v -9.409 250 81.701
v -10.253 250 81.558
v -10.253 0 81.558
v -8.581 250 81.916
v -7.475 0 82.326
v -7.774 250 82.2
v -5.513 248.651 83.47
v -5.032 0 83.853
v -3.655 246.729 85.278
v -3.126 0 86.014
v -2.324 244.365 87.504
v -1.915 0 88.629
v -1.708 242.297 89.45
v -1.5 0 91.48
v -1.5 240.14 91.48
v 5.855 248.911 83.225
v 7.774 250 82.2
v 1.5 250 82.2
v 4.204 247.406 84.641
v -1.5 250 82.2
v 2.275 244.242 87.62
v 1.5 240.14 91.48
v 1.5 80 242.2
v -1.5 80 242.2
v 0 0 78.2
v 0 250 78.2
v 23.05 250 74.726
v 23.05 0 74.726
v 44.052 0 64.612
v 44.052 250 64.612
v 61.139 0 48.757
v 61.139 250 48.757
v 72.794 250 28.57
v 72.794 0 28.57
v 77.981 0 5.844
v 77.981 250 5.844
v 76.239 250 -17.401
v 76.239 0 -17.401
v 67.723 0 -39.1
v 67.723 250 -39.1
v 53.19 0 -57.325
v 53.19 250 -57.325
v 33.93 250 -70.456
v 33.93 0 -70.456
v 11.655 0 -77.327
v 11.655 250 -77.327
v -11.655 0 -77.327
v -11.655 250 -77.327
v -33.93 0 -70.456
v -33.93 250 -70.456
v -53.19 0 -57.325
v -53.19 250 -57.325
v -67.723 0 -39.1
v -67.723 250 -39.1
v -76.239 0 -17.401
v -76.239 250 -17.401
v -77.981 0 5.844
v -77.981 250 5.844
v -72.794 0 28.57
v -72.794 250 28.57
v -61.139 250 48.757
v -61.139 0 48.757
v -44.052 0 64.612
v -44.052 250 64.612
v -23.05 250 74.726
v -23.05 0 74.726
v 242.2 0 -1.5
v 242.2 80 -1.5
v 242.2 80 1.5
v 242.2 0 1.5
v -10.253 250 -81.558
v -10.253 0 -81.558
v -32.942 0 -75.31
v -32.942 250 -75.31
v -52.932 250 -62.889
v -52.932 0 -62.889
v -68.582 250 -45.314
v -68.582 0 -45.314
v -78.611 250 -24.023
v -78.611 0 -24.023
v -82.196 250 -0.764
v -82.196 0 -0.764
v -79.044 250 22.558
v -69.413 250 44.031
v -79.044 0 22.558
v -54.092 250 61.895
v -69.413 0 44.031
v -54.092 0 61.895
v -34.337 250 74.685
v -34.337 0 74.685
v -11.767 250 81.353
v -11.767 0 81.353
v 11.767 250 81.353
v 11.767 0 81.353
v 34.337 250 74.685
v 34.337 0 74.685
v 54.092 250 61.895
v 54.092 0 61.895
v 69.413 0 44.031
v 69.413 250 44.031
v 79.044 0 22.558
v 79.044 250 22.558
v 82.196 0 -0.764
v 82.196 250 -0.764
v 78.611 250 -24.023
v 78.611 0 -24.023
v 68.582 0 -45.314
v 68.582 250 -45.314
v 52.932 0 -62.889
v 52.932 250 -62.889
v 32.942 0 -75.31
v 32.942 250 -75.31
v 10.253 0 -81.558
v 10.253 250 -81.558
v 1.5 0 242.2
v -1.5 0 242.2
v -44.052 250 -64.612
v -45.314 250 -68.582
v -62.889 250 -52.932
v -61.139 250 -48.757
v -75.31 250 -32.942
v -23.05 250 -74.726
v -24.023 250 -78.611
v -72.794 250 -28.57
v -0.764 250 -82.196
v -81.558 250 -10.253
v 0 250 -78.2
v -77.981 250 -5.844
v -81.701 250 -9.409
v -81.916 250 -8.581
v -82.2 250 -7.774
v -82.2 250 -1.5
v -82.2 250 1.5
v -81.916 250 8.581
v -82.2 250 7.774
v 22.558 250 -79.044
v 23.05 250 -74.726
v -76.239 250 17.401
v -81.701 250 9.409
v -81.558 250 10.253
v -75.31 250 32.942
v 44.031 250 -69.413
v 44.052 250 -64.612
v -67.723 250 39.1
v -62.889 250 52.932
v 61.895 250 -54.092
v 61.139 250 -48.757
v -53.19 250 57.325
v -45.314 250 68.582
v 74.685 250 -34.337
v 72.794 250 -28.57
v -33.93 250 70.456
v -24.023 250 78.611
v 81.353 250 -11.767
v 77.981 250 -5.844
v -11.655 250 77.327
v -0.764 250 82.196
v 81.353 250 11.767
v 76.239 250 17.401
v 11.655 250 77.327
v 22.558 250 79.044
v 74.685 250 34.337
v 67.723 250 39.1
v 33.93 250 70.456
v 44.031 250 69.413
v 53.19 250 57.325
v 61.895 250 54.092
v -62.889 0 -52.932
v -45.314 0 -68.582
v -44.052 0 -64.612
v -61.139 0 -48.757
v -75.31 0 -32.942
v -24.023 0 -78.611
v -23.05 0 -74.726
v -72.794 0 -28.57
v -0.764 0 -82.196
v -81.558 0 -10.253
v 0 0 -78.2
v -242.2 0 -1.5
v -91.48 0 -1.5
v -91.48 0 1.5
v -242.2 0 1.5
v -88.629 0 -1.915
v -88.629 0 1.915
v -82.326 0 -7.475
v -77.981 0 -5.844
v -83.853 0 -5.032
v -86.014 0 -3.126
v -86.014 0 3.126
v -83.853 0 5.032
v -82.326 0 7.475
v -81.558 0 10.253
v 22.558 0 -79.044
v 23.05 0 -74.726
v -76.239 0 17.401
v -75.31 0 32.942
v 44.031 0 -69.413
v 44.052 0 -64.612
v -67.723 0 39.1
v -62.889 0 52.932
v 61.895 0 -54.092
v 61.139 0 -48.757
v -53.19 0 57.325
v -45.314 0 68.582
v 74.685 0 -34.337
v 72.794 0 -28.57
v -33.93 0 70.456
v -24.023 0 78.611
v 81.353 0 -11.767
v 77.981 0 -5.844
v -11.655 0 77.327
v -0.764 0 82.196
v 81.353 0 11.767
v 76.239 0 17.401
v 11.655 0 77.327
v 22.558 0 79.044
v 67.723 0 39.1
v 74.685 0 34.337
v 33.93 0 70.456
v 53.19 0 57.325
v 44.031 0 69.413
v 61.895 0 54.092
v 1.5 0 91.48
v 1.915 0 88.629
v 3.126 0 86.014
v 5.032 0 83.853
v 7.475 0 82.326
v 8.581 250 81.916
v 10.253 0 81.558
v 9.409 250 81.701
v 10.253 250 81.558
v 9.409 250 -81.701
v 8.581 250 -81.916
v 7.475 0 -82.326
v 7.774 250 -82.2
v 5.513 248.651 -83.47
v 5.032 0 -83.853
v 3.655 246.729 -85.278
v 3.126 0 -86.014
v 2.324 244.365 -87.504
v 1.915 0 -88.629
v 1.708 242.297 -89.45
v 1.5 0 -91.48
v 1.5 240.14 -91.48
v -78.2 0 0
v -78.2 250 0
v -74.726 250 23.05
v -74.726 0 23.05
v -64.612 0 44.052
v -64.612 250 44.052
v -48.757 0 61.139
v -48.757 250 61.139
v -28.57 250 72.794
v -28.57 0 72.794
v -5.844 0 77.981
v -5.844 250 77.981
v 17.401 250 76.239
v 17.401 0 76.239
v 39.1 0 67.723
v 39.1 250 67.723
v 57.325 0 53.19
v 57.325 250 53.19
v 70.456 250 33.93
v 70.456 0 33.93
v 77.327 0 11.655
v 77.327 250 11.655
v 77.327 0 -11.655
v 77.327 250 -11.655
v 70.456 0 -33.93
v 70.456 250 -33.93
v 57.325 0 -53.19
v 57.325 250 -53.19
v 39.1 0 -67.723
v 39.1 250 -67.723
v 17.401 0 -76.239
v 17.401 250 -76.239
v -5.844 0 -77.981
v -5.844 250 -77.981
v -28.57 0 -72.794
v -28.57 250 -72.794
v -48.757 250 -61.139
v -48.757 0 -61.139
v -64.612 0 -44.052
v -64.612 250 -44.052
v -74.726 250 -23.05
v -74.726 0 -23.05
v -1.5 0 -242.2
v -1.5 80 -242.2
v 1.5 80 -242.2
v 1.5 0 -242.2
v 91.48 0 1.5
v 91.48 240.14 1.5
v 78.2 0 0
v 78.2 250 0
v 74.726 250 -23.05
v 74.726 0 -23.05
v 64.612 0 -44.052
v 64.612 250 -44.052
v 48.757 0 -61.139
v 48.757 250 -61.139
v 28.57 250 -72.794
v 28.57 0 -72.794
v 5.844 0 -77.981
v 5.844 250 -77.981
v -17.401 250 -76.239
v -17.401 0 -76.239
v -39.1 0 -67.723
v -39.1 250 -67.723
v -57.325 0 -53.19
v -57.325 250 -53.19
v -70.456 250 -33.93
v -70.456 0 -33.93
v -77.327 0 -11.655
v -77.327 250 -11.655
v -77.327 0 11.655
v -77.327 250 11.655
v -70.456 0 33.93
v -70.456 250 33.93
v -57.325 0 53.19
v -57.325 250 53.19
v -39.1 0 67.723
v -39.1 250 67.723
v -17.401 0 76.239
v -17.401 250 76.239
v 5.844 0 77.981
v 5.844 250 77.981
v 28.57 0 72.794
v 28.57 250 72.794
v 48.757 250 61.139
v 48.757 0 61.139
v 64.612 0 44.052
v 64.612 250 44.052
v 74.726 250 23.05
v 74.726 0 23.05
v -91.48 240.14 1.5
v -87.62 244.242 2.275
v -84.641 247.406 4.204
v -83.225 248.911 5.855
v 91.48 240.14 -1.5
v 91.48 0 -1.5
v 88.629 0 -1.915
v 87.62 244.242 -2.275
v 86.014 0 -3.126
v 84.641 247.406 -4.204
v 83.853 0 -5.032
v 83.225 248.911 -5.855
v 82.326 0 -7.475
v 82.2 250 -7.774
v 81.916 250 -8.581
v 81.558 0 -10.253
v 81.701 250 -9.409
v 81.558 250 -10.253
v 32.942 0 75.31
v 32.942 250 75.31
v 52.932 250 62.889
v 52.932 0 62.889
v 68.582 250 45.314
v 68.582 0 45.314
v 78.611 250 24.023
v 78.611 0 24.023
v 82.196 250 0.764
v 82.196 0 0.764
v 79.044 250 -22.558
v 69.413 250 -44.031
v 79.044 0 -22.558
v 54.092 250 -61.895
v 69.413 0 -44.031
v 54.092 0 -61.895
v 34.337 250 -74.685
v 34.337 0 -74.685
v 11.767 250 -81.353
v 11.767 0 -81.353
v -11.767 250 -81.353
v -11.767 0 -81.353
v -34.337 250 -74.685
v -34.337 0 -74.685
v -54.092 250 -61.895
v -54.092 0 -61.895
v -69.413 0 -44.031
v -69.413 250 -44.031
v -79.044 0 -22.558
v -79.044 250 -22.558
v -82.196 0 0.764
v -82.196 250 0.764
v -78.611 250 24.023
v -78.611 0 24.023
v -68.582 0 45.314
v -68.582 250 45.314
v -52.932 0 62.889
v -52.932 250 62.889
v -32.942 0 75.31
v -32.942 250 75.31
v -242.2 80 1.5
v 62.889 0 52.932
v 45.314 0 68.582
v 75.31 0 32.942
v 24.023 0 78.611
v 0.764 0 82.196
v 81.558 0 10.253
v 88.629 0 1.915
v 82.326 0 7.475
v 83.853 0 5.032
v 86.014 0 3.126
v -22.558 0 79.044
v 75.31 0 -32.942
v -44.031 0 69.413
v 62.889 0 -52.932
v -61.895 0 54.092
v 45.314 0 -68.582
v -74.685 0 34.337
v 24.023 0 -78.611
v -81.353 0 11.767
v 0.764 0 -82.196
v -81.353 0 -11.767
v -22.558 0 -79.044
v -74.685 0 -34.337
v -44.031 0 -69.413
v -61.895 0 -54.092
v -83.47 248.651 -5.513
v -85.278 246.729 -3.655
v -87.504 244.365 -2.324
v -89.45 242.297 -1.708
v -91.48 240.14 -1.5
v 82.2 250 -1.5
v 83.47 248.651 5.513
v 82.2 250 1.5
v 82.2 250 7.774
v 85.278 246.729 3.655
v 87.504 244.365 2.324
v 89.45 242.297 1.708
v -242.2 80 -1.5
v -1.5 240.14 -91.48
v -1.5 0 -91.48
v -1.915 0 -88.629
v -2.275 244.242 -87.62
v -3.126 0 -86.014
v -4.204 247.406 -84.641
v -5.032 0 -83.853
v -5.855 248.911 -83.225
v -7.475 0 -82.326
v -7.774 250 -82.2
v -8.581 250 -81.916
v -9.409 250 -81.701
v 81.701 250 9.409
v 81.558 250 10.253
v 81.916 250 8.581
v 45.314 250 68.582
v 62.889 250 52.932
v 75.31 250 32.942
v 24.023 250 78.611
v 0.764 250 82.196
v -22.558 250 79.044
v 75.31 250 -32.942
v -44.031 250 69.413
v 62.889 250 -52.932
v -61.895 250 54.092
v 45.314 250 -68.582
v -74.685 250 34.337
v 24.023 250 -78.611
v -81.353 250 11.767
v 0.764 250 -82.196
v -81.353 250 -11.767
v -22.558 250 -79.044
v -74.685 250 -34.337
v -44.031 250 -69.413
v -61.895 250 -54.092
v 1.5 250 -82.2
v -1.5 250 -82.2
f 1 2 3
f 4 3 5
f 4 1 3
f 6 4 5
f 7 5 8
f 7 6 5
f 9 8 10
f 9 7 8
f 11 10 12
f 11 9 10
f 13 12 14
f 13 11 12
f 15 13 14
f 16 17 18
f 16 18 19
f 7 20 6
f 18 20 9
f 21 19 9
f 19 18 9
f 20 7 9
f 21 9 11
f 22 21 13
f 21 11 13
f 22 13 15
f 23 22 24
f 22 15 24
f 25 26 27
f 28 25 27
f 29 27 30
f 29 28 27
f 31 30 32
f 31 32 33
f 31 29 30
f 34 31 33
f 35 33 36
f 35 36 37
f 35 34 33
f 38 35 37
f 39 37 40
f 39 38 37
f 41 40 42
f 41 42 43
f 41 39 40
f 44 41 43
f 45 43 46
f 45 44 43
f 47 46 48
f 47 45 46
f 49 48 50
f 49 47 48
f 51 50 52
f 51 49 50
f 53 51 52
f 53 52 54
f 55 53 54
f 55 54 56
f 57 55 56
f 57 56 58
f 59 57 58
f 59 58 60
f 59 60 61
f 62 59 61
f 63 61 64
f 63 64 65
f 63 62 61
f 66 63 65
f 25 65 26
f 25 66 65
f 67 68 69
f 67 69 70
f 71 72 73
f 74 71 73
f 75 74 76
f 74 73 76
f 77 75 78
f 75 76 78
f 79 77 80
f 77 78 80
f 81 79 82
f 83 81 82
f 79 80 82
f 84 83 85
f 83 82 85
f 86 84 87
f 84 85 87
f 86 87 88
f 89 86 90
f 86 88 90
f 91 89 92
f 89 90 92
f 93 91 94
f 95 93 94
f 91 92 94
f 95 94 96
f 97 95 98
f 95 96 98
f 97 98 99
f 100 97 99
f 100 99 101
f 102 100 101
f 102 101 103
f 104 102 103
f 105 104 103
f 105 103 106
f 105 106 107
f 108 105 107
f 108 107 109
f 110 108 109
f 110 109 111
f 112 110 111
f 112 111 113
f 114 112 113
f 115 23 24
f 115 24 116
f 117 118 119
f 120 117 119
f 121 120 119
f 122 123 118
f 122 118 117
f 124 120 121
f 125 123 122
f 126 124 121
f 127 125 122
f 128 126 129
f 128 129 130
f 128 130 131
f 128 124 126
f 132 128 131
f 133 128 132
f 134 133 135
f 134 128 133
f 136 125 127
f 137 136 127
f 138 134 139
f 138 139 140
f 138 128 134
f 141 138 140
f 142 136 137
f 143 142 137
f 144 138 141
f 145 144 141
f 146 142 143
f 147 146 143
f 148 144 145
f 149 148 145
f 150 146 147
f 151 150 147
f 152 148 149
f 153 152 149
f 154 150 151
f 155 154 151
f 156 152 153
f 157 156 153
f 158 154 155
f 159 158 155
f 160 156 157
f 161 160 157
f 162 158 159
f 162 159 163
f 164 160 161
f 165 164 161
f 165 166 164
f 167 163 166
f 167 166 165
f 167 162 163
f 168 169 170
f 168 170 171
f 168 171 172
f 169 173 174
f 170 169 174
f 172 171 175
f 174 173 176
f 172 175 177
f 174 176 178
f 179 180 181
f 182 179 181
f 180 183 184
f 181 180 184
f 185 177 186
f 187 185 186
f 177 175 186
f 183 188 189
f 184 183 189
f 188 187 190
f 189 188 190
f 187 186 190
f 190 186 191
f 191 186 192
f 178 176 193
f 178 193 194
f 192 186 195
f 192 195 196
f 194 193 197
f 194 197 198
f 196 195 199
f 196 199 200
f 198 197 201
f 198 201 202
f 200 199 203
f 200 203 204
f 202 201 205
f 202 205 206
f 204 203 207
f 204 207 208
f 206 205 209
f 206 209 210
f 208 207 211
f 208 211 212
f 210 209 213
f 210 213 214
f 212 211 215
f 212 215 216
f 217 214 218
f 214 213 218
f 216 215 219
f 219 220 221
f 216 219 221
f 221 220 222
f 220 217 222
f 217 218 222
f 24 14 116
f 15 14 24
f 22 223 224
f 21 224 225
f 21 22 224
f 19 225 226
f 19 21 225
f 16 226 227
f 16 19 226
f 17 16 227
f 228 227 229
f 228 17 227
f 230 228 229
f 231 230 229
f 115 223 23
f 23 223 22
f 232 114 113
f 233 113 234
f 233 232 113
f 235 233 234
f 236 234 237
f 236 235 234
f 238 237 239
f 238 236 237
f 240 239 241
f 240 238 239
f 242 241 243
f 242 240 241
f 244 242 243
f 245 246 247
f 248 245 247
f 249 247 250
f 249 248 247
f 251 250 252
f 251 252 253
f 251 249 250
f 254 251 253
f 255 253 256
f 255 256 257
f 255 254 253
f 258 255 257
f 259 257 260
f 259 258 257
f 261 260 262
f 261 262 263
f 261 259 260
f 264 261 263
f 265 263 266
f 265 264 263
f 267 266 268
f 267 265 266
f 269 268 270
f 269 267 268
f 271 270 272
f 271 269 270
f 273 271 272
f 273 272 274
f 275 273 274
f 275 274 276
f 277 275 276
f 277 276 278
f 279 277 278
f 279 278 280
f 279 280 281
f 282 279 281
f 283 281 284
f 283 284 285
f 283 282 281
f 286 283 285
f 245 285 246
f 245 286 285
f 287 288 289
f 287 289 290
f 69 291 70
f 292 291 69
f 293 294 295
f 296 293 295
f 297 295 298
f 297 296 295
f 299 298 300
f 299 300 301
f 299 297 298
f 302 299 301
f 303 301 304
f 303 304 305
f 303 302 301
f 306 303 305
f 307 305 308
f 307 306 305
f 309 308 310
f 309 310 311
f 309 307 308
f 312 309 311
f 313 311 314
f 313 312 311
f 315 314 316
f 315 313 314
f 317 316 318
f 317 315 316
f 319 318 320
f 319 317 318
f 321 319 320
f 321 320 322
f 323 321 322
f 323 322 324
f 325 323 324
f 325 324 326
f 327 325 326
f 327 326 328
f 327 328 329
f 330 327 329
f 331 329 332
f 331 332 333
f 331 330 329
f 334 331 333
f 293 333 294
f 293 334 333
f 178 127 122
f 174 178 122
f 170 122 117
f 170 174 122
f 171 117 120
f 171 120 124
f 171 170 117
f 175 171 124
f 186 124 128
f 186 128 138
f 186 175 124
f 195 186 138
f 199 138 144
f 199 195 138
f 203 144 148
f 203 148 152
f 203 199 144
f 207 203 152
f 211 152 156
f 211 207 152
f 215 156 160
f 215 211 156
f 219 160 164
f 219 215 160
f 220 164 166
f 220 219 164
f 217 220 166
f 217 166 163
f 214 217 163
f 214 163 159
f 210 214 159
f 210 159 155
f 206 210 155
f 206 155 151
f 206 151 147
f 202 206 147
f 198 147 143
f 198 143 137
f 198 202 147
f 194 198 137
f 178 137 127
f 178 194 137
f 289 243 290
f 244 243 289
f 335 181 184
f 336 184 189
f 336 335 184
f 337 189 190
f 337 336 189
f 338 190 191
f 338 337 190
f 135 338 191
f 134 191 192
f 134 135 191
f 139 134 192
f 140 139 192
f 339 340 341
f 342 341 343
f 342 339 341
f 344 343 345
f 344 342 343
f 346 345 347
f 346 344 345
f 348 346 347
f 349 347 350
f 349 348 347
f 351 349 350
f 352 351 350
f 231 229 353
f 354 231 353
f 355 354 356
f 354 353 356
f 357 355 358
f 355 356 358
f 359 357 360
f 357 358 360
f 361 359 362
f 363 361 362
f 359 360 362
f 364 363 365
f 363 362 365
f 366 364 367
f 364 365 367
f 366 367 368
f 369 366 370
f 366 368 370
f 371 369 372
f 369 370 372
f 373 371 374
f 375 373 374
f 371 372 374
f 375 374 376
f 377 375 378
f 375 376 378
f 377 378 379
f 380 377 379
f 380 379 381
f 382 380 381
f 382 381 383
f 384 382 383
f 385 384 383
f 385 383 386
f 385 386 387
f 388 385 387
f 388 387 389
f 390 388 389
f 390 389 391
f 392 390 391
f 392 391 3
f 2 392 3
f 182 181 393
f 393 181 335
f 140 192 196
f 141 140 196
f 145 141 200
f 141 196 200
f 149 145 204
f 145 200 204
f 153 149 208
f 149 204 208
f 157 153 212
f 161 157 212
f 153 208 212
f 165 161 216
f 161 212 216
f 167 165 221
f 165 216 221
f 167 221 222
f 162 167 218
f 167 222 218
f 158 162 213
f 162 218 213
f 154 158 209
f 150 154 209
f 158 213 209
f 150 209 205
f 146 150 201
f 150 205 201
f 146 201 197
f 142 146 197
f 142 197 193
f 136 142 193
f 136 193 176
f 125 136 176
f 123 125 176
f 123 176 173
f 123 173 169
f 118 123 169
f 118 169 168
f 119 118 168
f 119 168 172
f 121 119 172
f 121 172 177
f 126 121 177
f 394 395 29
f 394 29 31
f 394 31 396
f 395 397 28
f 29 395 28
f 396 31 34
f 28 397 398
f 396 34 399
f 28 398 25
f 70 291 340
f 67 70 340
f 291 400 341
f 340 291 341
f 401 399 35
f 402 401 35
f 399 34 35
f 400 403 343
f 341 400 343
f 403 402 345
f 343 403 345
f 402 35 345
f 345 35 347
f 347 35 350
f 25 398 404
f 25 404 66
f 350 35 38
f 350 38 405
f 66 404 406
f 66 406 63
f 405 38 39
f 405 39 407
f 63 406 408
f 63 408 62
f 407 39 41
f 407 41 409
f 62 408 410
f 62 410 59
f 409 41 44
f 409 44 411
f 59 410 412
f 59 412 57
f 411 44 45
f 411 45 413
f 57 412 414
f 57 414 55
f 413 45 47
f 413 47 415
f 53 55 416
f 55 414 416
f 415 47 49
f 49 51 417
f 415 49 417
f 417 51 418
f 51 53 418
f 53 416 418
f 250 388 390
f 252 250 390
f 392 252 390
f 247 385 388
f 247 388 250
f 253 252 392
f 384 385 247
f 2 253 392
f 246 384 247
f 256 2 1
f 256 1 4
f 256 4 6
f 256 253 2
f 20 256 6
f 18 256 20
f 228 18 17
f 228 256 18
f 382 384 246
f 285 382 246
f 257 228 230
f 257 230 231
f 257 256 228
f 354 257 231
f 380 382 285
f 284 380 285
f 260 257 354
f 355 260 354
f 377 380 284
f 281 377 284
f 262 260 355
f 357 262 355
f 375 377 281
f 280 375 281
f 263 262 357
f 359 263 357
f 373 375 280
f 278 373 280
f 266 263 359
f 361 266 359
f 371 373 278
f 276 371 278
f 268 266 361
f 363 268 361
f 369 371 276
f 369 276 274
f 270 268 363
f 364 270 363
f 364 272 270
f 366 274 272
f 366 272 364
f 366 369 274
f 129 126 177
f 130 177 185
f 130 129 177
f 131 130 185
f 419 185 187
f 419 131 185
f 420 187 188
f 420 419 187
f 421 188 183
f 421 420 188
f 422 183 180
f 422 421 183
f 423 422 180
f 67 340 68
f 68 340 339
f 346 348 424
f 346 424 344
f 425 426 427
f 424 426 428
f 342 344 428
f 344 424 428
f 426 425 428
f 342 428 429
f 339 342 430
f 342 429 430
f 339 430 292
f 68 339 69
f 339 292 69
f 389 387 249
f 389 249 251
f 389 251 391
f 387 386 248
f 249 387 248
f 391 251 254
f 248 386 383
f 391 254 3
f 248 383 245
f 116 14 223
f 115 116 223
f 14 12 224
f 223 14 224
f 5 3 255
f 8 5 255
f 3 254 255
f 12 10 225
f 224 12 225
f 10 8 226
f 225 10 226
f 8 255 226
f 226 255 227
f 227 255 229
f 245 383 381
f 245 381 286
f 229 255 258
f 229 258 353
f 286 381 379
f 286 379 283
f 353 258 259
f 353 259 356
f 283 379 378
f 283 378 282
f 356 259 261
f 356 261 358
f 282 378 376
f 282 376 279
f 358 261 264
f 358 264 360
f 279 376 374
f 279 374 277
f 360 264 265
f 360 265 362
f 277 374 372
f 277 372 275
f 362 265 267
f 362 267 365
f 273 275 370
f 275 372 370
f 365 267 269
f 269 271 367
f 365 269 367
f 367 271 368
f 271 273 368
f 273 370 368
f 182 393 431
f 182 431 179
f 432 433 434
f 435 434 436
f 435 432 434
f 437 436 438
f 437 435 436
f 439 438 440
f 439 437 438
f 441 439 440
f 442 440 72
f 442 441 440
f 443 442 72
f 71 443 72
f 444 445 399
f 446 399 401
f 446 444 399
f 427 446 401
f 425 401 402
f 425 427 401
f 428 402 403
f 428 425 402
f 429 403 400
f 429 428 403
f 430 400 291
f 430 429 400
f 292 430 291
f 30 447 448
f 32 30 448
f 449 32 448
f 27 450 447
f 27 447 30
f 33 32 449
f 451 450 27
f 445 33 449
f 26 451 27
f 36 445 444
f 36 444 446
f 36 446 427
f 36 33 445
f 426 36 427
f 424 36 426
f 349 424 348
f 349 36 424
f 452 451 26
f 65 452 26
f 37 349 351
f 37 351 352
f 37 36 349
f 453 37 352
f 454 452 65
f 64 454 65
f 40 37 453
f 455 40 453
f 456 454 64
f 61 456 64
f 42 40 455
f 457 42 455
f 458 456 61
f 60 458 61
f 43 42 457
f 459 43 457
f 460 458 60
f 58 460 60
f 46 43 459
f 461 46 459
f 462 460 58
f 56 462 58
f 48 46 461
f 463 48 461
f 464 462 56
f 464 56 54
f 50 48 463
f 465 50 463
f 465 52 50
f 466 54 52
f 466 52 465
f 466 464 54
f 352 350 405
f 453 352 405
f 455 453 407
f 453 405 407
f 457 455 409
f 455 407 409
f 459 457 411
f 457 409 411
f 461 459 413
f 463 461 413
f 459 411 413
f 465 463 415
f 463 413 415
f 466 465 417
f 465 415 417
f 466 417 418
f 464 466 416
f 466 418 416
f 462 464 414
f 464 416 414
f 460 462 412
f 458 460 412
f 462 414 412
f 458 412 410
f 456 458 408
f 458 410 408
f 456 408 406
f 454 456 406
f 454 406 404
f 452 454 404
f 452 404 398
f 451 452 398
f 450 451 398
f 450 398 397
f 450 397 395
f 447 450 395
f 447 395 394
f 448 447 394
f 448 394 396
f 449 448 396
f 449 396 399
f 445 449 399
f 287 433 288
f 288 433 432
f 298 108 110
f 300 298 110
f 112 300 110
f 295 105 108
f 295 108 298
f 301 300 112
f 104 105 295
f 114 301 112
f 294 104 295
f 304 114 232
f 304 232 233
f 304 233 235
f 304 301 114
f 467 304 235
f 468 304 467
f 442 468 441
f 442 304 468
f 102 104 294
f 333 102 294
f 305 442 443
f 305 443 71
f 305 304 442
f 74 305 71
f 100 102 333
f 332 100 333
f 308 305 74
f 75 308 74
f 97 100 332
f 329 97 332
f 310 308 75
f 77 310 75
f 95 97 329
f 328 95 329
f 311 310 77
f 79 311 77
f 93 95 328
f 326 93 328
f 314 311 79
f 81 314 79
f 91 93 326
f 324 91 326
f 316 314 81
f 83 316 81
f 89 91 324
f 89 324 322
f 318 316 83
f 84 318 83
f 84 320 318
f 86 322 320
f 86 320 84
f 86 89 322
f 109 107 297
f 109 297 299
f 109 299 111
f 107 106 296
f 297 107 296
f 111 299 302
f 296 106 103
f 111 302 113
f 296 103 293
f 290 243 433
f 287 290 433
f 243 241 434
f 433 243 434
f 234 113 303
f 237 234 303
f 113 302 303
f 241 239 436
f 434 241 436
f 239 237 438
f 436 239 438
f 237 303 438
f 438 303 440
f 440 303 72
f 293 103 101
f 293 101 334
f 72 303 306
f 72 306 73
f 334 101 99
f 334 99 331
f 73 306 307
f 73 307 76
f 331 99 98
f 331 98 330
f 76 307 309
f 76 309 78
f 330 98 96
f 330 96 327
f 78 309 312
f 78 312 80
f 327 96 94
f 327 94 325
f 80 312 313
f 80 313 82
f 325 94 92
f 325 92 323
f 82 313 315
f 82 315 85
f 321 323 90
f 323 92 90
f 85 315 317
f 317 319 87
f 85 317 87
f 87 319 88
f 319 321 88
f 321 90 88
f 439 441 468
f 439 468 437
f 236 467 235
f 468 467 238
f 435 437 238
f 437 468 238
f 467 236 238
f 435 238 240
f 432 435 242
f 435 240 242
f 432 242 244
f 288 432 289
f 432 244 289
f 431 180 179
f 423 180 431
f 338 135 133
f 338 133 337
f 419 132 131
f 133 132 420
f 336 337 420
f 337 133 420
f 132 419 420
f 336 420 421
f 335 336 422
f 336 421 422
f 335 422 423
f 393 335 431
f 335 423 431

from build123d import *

# Parameters (mm, degrees)
SKETCH1_R                = 82.2
SKETCH1_R_2              = 78.2
BOSS_EXTRUDE1_DEPTH      = 250
BOSS_EXTRUDE2_DEPTH      = 1.5
BOSS_EXTRUDE2_DEPTH_BACK = 1.5
BOSS_EXTRUDE3_DEPTH      = 1.5
BOSS_EXTRUDE3_DEPTH_BACK = 1.5
SKETCH4_W                = 2
SKETCH4_H                = 250
FILLET1_R                = 10
CIRPATTERN1_COUNT        = 4


with BuildPart() as part:
    # Sketch1 → Boss-Extrude1 (new body)
    with BuildSketch(Plane(origin=(0, 0, 0), x_dir=(1, 0, 0), z_dir=(0, 1, 0))):
        with Locations(Location((0, 0, 0), (0, 0, 270))):
            Circle(SKETCH1_R)
        with Locations(Location((0, 0, 0), (0, 0, 270))):
            Circle(SKETCH1_R_2, mode=Mode.SUBTRACT)
    extrude(amount=BOSS_EXTRUDE1_DEPTH)



with BuildPart() as body_2:
    # Sketch2 → Boss-Extrude2 (new, two sides: drawn at the far end of the back side and taken through both)
    with BuildSketch(Plane.XY.offset(-BOSS_EXTRUDE2_DEPTH_BACK)):
        Polygon((82.2, 0), (82.2, 250), (242.2, 80), (242.2, 0), align=None)
    extrude(amount=BOSS_EXTRUDE2_DEPTH + BOSS_EXTRUDE2_DEPTH_BACK)


with BuildPart() as part_1:
    add(part.part)

    add(body_2.part)  # Boss-Extrude3 merges body 2
    # Sketch4 → Boss-Extrude3 (add, two sides: drawn at the far end of the back side and taken through both)
    with BuildSketch(Plane.XY.offset(-BOSS_EXTRUDE3_DEPTH_BACK)):
        with Locations((81.2, 125)):
            Rectangle(SKETCH4_W, SKETCH4_H)
    extrude(amount=BOSS_EXTRUDE3_DEPTH + BOSS_EXTRUDE3_DEPTH_BACK)

    # Fillet1
    # the kernel refuses this fillet: 10 mm, written as the material it adds along each edge
    with BuildSketch(Plane(origin=(82.186312729, 250, -1.5), x_dir=(1, 0, 0), z_dir=(0, -1, 0))) as fillet1_piece_1_section:
        with BuildLine():
            CenterArc((9.293685085, -10), FILLET1_R, 90, 82.834902495)
            ThreePointArc((-0.628223572, -8.752711497), (-0.19722945, -4.384744947), (0, 0))
            Line((0, 0), (9.293685085, 0))
        make_face()
    fillet1_piece_1 = extrude(amount=250, mode=Mode.PRIVATE)
    fillet1_piece_1 = split(fillet1_piece_1, bisect_by=Plane(origin=(146.068392849, 182.139832598, -3.473148008), z_dir=(-0.7281999926928029, -0.685364699004991, 0)), keep=Keep.TOP, mode=Mode.PRIVATE)
    add(fillet1_piece_1)
    with BuildSketch(Plane(origin=(82.186312729, 250, 1.5), x_dir=(-0.07159057113580586, 0, 0.9974341031488995), z_dir=(0, -1, 0))) as fillet1_piece_2_section:
        with BuildLine():
            CenterArc((9.309000808, -9.985744159), FILLET1_R, 93.059748024, 82.834902495)
            Line((-0.665340223, -9.269838447), (0, 0))
            ThreePointArc((0, 0), (4.387613913, -0.117183015), (8.775227826, 0))
        make_face()
    fillet1_piece_2 = extrude(amount=250, mode=Mode.PRIVATE)
    fillet1_piece_2 = split(fillet1_piece_2, bisect_by=Plane(origin=(146.06839285, 182.139832597, 3.473148008), z_dir=(-0.7281999926928029, -0.685364699004991, 0)), keep=Keep.TOP, mode=Mode.PRIVATE)
    add(fillet1_piece_2)


with BuildPart() as cirpattern1_1:
    # CirPattern1: pattern copy
    add(part_1.part.rotate(Axis((0, 0, 0), (0, 1, 0)), 1 * 360 / CIRPATTERN1_COUNT))


with BuildPart() as cirpattern1_2:
    # CirPattern1: pattern copy
    add(part_1.part.rotate(Axis((0, 0, 0), (0, 1, 0)), 2 * 360 / CIRPATTERN1_COUNT))


with BuildPart() as cirpattern1_3:
    # CirPattern1: pattern copy
    add(part_1.part.rotate(Axis((0, 0, 0), (0, 1, 0)), 3 * 360 / CIRPATTERN1_COUNT))


solid = Compound([part_1.part, cirpattern1_1.part, cirpattern1_2.part, cirpattern1_3.part])
